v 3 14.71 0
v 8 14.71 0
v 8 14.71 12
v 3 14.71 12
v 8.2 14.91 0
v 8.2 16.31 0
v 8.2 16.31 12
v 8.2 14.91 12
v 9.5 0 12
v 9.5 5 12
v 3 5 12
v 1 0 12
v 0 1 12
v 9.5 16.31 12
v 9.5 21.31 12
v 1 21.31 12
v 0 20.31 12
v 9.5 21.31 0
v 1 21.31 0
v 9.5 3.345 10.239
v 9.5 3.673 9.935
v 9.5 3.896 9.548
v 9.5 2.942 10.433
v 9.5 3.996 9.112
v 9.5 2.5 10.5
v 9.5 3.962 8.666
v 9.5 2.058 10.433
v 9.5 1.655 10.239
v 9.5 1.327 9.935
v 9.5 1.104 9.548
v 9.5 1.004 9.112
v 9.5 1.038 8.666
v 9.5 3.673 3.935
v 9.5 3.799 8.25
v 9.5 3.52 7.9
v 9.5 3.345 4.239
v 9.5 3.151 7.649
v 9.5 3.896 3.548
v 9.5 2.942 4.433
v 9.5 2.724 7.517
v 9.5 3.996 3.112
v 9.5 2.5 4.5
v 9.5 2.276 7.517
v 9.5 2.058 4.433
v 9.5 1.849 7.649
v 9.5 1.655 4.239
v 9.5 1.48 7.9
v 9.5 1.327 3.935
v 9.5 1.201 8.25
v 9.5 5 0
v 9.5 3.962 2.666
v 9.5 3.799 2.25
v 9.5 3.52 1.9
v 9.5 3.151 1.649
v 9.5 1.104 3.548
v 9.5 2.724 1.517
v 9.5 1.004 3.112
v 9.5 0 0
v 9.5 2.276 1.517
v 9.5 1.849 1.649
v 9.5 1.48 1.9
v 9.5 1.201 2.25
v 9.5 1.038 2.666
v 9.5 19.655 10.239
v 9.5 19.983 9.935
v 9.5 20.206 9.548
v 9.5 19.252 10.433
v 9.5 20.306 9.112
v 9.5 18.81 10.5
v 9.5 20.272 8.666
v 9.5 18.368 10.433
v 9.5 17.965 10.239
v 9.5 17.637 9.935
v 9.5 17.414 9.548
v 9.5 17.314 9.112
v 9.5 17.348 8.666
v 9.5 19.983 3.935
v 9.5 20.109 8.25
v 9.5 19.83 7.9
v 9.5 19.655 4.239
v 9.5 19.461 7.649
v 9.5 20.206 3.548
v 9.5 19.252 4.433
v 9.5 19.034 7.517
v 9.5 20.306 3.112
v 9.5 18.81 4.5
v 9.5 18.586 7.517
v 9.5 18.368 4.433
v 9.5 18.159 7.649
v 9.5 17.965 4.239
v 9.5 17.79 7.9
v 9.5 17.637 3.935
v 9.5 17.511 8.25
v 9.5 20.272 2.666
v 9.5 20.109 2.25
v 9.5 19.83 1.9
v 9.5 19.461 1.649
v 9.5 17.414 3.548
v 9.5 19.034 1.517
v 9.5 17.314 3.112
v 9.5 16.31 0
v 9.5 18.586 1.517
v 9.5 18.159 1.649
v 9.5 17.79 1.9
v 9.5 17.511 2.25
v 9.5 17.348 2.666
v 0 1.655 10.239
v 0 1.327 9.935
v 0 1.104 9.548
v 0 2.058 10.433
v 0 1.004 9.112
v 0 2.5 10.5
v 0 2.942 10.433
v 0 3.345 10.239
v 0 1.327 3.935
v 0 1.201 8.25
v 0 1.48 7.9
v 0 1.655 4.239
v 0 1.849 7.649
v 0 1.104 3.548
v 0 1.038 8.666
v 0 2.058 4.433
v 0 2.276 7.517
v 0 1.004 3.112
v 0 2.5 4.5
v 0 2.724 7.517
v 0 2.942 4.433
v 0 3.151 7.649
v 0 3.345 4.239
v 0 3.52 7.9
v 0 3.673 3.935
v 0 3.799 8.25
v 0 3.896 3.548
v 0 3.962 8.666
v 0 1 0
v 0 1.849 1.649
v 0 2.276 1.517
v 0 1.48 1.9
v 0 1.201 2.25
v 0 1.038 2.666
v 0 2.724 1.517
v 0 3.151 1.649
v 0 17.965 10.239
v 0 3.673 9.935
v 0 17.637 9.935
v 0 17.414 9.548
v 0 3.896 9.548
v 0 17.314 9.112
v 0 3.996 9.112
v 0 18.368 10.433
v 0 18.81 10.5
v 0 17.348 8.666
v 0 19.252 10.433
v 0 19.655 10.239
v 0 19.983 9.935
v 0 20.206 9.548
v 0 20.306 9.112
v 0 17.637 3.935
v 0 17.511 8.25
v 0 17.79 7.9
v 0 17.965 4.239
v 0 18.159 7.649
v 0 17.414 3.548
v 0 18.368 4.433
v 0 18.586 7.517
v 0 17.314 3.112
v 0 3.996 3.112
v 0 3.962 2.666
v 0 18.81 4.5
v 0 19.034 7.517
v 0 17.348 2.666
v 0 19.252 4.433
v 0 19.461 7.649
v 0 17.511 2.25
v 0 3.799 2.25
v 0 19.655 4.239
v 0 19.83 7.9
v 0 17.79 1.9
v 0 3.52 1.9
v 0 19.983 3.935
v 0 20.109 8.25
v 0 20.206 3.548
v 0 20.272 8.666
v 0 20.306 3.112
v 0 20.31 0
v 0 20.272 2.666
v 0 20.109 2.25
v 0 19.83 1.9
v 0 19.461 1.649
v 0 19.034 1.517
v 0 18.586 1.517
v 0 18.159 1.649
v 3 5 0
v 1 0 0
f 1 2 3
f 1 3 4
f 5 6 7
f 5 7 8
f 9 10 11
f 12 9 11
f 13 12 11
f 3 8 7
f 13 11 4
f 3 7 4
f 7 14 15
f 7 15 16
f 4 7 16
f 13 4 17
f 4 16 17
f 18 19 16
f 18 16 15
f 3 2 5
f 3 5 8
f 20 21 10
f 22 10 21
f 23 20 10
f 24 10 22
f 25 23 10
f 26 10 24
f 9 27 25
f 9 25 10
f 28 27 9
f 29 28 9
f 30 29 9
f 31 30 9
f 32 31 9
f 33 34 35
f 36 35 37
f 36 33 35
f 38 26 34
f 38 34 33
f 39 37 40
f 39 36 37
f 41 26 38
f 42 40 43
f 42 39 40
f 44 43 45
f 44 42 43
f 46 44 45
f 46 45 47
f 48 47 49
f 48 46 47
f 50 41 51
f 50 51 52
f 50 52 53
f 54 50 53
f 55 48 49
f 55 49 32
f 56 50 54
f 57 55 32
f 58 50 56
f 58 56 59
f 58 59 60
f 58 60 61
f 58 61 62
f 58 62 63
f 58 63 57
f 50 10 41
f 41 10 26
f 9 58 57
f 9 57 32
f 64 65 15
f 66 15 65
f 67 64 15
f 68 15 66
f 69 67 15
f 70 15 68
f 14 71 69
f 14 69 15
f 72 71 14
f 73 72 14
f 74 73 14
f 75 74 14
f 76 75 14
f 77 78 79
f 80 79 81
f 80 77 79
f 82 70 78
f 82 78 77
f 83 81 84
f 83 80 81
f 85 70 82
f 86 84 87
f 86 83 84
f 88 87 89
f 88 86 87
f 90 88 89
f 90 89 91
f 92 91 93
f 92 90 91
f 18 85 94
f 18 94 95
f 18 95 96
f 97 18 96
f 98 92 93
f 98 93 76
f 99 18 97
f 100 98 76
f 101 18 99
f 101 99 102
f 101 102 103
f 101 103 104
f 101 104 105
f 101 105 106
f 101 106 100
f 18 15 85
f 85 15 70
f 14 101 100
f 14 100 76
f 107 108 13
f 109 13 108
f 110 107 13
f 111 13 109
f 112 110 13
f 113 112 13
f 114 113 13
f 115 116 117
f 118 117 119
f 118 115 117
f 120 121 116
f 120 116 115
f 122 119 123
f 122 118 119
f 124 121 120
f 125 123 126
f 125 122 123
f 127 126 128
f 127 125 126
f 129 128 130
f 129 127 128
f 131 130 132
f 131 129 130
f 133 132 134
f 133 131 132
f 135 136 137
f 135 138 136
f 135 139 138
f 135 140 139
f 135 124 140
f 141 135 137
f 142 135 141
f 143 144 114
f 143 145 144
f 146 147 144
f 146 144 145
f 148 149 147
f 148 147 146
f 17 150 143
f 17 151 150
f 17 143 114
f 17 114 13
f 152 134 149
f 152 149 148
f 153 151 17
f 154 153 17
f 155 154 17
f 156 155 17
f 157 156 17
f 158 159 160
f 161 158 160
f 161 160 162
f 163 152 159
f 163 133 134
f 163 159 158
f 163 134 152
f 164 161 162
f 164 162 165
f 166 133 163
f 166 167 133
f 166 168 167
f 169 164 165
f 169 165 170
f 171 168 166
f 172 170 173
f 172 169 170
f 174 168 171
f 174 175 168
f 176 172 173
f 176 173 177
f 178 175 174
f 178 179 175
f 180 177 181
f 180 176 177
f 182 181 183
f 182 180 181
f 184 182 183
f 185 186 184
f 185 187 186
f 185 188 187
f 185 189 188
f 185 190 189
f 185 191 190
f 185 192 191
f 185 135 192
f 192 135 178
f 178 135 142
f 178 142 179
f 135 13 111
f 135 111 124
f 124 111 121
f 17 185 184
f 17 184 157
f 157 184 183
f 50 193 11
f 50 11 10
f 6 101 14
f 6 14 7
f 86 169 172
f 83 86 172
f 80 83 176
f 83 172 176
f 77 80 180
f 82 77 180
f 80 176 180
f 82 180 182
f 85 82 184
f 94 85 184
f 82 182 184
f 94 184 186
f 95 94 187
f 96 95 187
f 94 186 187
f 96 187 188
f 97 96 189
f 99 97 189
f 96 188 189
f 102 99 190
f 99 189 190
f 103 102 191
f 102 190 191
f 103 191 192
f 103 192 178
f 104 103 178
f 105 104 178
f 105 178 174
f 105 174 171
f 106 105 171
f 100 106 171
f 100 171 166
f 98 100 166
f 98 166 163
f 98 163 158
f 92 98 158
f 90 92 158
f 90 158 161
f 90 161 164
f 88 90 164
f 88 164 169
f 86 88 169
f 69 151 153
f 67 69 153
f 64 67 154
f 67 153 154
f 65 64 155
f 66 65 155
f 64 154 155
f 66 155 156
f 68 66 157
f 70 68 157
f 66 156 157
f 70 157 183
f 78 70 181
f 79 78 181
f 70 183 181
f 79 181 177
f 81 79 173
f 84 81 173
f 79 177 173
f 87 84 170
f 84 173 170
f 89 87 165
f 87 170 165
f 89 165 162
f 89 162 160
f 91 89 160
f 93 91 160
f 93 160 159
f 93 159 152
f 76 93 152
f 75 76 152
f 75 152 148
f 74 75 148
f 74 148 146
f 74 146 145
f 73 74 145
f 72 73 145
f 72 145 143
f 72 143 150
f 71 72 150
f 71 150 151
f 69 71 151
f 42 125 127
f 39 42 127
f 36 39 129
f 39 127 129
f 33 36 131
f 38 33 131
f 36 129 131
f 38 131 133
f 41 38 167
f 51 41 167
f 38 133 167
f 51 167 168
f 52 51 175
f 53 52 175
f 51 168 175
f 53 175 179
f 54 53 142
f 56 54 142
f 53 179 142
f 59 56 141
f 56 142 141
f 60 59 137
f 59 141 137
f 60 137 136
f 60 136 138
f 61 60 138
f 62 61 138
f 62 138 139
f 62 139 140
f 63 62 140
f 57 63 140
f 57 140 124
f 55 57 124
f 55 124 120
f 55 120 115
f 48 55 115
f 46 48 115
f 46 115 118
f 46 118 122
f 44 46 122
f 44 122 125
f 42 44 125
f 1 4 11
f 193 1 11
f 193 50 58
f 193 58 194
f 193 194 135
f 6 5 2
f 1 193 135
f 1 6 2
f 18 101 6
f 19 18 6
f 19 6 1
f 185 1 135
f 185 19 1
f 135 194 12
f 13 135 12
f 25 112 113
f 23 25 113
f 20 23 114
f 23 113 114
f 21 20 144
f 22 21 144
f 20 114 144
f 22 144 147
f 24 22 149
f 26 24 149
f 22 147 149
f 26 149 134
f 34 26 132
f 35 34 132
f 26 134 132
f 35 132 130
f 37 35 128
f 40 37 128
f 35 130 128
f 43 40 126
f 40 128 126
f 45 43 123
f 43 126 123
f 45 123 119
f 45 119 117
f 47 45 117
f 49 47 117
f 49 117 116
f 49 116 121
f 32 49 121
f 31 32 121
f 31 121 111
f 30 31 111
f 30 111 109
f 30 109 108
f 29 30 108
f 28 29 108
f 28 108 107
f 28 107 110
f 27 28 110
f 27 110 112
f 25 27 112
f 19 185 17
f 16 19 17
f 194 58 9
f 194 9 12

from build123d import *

# Parameters (mm, degrees)
EXTRUDE_1_DEPTH     = 12
CHAMFER_1_SIZE      = 0.2
SKETCH_2_R          = 1.5
CUT_EXTRUDE_1_DEPTH = 27.236731885
CHAMFER_2_SIZE      = 1


with BuildPart() as part:
    # 草图1 → 凸台-拉伸1 (new body)
    with BuildSketch(Plane.XY):
        Polygon((0, 0), (0, 21.31), (9.5, 21.31), (9.5, 16.31), (8.2, 16.31), (8.2, 14.71), (3, 14.71), (3, 5), (9.5, 5), (9.5, 0), align=None)
    extrude(amount=EXTRUDE_1_DEPTH)

    # 倒角1
    chamfer_1_edges = [part.edges().sort_by_distance(p)[0] for p in [
        (8.2, 14.71, 6),
    ]]
    chamfer(chamfer_1_edges, length=CHAMFER_1_SIZE)

    # 草图2 → 切除-拉伸1 (cut, through all)
    with BuildSketch(Plane.ZY):
        with Locations((9, 18.81)):
            Circle(SKETCH_2_R)
        with Locations((3, 18.81)):
            Circle(SKETCH_2_R)
        with Locations((3, 2.5)):
            Circle(SKETCH_2_R)
        with Locations((9, 2.5)):
            Circle(SKETCH_2_R)
    extrude(amount=-CUT_EXTRUDE_1_DEPTH, mode=Mode.SUBTRACT)

    # 倒角2
    chamfer_2_edges = [part.edges().sort_by_distance(p)[0] for p in [
        (0, 0, 6),
        (0, 21.31, 6),
    ]]
    chamfer(chamfer_2_edges, length=CHAMFER_2_SIZE - 0.0001)  # a hair under: the kernel refuses the full size


solid = part.part
